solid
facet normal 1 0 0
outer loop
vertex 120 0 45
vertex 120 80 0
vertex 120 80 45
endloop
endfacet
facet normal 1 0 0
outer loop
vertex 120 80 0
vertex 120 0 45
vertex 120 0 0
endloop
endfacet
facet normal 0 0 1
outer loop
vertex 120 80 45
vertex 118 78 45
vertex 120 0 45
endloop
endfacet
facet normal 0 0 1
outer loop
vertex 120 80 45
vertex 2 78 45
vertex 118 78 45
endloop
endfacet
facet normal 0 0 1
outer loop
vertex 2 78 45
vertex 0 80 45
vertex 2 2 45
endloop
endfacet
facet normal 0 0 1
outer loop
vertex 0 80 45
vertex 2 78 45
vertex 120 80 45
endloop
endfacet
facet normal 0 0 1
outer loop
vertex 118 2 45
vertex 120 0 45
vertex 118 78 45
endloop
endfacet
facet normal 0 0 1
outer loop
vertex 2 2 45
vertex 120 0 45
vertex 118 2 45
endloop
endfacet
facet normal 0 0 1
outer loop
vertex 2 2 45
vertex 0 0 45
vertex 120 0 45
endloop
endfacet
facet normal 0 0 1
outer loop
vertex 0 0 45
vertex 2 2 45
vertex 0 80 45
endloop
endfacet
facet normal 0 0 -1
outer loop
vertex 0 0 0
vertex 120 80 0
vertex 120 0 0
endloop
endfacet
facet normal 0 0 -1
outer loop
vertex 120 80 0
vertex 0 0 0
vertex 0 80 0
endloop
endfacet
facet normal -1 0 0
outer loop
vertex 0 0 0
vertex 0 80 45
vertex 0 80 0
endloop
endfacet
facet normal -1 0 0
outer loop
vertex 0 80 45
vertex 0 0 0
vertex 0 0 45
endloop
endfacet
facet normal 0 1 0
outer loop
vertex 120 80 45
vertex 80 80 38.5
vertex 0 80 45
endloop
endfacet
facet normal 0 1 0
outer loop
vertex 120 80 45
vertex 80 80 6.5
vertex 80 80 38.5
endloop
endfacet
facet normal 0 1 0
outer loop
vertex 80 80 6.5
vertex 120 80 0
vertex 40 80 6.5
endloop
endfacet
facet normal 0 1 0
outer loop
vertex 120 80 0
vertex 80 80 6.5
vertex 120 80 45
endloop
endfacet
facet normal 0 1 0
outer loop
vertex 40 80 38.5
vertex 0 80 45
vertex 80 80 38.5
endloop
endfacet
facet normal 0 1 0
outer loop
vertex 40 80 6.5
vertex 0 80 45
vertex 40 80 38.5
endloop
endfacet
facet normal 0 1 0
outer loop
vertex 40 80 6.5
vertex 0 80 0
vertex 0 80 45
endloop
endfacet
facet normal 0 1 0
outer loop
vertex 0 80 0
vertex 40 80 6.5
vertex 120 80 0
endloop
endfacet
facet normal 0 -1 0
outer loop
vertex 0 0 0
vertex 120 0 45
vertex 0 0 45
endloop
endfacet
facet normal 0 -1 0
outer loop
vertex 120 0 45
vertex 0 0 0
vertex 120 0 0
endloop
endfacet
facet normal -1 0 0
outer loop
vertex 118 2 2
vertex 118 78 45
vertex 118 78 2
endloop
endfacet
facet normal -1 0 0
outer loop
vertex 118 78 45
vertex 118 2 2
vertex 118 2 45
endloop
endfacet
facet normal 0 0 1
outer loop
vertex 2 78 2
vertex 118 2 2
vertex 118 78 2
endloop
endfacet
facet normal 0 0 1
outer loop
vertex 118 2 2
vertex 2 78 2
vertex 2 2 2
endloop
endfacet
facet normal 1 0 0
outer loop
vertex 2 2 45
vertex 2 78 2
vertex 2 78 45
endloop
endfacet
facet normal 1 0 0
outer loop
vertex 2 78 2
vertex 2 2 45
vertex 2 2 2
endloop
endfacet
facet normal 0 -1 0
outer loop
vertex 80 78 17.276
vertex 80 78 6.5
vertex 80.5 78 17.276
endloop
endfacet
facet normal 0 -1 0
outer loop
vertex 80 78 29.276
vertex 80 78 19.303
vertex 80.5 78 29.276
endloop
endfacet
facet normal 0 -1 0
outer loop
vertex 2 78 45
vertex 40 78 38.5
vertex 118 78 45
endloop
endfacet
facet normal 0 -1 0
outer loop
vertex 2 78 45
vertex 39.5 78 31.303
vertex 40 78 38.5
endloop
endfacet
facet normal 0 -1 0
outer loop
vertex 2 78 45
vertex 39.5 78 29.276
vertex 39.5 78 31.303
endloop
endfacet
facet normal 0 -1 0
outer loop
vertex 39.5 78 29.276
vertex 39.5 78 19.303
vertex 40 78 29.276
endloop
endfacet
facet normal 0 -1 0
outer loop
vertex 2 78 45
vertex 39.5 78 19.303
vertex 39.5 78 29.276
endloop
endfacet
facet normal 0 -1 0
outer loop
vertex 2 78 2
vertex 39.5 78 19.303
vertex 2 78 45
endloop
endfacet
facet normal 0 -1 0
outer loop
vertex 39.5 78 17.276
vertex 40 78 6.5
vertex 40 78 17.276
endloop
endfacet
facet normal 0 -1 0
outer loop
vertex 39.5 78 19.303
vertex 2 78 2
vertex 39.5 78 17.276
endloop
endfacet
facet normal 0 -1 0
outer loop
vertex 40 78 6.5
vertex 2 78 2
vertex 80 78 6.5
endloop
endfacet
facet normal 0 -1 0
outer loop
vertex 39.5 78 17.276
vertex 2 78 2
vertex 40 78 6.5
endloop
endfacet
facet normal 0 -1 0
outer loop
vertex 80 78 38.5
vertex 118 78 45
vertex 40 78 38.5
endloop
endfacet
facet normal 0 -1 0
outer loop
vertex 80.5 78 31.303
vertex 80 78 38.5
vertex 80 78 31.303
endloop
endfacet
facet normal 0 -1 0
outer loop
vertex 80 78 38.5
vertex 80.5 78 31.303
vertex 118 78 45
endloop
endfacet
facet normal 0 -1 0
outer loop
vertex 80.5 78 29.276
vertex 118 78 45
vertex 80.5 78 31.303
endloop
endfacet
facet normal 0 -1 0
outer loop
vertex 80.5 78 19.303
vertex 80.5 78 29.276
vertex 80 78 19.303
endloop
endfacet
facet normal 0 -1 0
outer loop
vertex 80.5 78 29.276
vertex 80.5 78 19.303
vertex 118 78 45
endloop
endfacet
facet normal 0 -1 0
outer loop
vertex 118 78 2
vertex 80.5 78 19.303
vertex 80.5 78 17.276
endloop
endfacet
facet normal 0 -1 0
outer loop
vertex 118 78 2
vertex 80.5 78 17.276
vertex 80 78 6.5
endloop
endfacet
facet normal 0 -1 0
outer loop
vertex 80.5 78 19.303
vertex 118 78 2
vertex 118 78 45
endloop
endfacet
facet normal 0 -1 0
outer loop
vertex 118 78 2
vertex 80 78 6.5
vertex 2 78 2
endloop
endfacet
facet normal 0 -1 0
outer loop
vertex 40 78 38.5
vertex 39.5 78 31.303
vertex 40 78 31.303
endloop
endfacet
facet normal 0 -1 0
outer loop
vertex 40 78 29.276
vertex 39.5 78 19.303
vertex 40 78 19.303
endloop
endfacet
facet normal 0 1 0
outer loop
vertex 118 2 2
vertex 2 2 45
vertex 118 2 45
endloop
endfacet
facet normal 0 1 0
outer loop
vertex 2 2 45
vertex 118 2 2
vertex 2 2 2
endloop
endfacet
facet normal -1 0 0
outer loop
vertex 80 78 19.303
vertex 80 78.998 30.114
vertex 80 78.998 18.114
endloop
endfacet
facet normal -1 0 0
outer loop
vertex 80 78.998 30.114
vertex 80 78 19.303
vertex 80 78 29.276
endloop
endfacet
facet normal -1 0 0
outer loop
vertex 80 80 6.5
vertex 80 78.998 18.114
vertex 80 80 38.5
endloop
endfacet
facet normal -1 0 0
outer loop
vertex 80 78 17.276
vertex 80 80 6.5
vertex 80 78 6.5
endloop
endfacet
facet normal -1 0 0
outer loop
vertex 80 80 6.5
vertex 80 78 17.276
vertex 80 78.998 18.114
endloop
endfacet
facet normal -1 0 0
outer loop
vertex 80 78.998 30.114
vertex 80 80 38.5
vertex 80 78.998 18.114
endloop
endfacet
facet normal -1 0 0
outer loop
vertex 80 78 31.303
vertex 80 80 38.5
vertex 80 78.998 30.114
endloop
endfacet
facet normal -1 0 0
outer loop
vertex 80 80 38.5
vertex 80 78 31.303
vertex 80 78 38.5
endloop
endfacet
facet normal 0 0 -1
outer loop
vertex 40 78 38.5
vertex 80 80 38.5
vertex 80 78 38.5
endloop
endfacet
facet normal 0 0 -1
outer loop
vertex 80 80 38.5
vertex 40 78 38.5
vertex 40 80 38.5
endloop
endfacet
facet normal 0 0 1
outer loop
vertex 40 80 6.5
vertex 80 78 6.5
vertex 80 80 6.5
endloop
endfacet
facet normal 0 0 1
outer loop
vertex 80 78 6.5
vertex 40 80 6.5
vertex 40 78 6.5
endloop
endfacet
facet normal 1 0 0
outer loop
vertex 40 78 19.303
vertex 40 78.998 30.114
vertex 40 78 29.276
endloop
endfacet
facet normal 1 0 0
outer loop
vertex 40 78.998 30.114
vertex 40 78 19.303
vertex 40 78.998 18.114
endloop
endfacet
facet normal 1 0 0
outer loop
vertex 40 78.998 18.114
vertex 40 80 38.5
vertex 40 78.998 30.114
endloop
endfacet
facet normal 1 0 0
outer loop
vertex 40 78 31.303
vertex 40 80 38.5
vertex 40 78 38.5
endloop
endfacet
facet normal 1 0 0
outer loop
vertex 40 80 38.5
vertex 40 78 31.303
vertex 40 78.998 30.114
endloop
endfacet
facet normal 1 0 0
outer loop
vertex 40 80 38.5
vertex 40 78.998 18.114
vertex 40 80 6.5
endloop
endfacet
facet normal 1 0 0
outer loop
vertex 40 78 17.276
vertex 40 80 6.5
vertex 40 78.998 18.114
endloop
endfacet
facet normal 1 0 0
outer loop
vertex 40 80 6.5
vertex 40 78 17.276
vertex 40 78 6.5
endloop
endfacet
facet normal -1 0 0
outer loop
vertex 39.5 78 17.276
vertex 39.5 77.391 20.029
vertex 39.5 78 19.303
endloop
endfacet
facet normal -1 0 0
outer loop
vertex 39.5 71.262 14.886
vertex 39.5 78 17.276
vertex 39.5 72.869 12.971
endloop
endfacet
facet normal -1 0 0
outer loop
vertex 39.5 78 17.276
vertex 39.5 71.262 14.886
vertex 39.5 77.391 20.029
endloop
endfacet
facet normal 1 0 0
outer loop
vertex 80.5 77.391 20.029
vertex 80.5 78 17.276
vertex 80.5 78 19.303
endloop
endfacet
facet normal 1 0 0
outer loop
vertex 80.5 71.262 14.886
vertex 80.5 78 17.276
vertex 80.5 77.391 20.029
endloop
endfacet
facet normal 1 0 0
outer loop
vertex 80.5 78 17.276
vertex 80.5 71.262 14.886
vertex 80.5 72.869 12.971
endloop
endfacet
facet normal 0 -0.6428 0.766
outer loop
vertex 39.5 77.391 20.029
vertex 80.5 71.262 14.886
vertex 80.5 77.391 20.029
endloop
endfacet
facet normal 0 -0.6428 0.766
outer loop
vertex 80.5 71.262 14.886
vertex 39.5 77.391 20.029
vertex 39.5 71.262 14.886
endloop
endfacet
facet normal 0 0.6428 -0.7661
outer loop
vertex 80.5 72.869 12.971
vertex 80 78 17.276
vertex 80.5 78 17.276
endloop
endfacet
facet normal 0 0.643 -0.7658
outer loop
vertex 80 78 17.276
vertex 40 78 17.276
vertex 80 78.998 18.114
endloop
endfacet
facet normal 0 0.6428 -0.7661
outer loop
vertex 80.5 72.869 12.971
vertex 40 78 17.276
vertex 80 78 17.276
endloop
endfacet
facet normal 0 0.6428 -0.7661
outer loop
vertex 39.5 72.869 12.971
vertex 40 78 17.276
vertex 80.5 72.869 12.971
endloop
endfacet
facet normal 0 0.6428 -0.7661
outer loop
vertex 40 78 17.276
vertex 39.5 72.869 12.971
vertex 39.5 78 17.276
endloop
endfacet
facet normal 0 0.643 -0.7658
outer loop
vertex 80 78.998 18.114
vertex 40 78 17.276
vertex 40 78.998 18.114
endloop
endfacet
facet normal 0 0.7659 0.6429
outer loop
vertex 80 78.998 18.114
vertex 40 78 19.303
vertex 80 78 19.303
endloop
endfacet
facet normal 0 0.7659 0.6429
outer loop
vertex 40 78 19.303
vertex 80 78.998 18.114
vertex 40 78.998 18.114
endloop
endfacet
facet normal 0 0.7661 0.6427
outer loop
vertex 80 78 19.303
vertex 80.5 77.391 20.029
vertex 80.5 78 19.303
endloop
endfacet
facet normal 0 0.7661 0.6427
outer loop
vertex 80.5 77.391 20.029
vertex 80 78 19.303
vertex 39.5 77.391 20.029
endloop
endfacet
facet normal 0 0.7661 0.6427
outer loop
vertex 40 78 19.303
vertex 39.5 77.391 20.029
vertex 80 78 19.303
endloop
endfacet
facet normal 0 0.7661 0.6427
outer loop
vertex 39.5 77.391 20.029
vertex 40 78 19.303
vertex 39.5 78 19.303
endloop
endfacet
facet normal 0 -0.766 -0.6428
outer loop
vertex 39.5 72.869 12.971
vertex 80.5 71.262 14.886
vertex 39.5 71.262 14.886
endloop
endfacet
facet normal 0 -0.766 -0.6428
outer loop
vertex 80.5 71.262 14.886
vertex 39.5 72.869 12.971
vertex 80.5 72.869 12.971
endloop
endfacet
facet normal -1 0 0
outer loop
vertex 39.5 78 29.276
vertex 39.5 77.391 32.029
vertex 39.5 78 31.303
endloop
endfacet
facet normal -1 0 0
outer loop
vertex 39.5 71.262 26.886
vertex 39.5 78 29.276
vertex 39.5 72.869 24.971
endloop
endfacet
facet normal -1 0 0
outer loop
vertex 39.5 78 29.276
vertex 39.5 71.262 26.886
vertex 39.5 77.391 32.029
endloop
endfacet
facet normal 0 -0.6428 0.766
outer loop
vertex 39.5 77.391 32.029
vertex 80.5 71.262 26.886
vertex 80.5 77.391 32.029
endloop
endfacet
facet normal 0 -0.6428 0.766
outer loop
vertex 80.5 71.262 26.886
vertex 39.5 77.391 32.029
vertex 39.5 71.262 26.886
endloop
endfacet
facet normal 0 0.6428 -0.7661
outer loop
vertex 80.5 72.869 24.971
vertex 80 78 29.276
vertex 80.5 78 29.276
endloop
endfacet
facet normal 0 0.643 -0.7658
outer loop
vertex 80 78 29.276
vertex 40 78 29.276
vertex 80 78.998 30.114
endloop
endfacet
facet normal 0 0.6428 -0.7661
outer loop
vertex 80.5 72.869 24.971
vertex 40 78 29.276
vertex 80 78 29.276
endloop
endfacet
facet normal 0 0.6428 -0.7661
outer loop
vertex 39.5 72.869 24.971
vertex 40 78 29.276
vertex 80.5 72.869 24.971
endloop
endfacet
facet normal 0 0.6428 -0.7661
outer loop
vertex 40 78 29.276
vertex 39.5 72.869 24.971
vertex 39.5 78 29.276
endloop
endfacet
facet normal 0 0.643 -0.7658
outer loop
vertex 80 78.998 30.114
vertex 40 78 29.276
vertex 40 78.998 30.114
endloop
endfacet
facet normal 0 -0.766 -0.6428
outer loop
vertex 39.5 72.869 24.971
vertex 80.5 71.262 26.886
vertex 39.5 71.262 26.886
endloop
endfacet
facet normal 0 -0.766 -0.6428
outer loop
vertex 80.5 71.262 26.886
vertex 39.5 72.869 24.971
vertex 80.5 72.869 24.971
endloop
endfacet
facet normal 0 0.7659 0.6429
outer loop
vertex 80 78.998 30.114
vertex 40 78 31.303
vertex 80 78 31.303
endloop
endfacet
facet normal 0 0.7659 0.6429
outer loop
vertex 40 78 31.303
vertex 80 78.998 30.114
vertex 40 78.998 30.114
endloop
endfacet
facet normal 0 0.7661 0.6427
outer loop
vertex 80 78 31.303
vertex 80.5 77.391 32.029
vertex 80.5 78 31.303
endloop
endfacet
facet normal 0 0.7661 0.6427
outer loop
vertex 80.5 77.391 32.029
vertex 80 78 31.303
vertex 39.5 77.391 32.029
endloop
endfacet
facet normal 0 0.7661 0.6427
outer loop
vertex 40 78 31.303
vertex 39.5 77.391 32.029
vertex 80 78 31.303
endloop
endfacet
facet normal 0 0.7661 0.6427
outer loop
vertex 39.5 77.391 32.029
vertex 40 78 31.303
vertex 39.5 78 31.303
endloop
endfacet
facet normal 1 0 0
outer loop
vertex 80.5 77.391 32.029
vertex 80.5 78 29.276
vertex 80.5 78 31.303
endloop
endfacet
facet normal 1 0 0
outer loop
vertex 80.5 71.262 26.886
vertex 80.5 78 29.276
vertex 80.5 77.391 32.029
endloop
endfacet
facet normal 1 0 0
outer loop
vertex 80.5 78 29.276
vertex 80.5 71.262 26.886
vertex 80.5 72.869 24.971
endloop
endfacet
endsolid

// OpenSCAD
$fn = 32;

// ----------------------------------------------------------------------
// Vent box: louvers enclosure
// ----------------------------------------------------------------------

// --- parameters (mm) ---
box_l = 120;              // box length, X
box_w = 80;               // box width, Y
box_h = 45;               // box height, Z
wall_t = 2;               // shell wall thickness
win_l = 40;               // vent window width, X
win_h = 32;               // vent window height, Z
slat_t = 2.5;             // louver slat thickness
slat_d = 8;               // louver slat depth
slat_a = 40;              // louver slat angle, degrees
slat_pitch = 12;          // louver pitch
slat_yc = 75.13;          // slat centreline Y

win_z0 = (box_h - win_h) / 2;  // window lower edge Z
n_slats = 2;  // louver count
slat_z0 = win_z0 + (win_h - (n_slats - 1) * slat_pitch) / 2;

difference() {
  union() {
    difference() {
      cube([box_l, box_w, box_h]);
  translate([wall_t, wall_t, wall_t])
    cube([box_l - 2 * wall_t, box_w - 2 * wall_t, box_h]);
  translate([(box_l - win_l) / 2, box_w - wall_t - 1, win_z0])
    cube([win_l, wall_t + 2, win_h]);
    }
    for (i = [0 : n_slats - 1])
      translate([box_l / 2, slat_yc, slat_z0 + i * slat_pitch])
        rotate([slat_a, 0, 0])
          cube([win_l + 1, slat_d, slat_t], center = true);
  }
}
